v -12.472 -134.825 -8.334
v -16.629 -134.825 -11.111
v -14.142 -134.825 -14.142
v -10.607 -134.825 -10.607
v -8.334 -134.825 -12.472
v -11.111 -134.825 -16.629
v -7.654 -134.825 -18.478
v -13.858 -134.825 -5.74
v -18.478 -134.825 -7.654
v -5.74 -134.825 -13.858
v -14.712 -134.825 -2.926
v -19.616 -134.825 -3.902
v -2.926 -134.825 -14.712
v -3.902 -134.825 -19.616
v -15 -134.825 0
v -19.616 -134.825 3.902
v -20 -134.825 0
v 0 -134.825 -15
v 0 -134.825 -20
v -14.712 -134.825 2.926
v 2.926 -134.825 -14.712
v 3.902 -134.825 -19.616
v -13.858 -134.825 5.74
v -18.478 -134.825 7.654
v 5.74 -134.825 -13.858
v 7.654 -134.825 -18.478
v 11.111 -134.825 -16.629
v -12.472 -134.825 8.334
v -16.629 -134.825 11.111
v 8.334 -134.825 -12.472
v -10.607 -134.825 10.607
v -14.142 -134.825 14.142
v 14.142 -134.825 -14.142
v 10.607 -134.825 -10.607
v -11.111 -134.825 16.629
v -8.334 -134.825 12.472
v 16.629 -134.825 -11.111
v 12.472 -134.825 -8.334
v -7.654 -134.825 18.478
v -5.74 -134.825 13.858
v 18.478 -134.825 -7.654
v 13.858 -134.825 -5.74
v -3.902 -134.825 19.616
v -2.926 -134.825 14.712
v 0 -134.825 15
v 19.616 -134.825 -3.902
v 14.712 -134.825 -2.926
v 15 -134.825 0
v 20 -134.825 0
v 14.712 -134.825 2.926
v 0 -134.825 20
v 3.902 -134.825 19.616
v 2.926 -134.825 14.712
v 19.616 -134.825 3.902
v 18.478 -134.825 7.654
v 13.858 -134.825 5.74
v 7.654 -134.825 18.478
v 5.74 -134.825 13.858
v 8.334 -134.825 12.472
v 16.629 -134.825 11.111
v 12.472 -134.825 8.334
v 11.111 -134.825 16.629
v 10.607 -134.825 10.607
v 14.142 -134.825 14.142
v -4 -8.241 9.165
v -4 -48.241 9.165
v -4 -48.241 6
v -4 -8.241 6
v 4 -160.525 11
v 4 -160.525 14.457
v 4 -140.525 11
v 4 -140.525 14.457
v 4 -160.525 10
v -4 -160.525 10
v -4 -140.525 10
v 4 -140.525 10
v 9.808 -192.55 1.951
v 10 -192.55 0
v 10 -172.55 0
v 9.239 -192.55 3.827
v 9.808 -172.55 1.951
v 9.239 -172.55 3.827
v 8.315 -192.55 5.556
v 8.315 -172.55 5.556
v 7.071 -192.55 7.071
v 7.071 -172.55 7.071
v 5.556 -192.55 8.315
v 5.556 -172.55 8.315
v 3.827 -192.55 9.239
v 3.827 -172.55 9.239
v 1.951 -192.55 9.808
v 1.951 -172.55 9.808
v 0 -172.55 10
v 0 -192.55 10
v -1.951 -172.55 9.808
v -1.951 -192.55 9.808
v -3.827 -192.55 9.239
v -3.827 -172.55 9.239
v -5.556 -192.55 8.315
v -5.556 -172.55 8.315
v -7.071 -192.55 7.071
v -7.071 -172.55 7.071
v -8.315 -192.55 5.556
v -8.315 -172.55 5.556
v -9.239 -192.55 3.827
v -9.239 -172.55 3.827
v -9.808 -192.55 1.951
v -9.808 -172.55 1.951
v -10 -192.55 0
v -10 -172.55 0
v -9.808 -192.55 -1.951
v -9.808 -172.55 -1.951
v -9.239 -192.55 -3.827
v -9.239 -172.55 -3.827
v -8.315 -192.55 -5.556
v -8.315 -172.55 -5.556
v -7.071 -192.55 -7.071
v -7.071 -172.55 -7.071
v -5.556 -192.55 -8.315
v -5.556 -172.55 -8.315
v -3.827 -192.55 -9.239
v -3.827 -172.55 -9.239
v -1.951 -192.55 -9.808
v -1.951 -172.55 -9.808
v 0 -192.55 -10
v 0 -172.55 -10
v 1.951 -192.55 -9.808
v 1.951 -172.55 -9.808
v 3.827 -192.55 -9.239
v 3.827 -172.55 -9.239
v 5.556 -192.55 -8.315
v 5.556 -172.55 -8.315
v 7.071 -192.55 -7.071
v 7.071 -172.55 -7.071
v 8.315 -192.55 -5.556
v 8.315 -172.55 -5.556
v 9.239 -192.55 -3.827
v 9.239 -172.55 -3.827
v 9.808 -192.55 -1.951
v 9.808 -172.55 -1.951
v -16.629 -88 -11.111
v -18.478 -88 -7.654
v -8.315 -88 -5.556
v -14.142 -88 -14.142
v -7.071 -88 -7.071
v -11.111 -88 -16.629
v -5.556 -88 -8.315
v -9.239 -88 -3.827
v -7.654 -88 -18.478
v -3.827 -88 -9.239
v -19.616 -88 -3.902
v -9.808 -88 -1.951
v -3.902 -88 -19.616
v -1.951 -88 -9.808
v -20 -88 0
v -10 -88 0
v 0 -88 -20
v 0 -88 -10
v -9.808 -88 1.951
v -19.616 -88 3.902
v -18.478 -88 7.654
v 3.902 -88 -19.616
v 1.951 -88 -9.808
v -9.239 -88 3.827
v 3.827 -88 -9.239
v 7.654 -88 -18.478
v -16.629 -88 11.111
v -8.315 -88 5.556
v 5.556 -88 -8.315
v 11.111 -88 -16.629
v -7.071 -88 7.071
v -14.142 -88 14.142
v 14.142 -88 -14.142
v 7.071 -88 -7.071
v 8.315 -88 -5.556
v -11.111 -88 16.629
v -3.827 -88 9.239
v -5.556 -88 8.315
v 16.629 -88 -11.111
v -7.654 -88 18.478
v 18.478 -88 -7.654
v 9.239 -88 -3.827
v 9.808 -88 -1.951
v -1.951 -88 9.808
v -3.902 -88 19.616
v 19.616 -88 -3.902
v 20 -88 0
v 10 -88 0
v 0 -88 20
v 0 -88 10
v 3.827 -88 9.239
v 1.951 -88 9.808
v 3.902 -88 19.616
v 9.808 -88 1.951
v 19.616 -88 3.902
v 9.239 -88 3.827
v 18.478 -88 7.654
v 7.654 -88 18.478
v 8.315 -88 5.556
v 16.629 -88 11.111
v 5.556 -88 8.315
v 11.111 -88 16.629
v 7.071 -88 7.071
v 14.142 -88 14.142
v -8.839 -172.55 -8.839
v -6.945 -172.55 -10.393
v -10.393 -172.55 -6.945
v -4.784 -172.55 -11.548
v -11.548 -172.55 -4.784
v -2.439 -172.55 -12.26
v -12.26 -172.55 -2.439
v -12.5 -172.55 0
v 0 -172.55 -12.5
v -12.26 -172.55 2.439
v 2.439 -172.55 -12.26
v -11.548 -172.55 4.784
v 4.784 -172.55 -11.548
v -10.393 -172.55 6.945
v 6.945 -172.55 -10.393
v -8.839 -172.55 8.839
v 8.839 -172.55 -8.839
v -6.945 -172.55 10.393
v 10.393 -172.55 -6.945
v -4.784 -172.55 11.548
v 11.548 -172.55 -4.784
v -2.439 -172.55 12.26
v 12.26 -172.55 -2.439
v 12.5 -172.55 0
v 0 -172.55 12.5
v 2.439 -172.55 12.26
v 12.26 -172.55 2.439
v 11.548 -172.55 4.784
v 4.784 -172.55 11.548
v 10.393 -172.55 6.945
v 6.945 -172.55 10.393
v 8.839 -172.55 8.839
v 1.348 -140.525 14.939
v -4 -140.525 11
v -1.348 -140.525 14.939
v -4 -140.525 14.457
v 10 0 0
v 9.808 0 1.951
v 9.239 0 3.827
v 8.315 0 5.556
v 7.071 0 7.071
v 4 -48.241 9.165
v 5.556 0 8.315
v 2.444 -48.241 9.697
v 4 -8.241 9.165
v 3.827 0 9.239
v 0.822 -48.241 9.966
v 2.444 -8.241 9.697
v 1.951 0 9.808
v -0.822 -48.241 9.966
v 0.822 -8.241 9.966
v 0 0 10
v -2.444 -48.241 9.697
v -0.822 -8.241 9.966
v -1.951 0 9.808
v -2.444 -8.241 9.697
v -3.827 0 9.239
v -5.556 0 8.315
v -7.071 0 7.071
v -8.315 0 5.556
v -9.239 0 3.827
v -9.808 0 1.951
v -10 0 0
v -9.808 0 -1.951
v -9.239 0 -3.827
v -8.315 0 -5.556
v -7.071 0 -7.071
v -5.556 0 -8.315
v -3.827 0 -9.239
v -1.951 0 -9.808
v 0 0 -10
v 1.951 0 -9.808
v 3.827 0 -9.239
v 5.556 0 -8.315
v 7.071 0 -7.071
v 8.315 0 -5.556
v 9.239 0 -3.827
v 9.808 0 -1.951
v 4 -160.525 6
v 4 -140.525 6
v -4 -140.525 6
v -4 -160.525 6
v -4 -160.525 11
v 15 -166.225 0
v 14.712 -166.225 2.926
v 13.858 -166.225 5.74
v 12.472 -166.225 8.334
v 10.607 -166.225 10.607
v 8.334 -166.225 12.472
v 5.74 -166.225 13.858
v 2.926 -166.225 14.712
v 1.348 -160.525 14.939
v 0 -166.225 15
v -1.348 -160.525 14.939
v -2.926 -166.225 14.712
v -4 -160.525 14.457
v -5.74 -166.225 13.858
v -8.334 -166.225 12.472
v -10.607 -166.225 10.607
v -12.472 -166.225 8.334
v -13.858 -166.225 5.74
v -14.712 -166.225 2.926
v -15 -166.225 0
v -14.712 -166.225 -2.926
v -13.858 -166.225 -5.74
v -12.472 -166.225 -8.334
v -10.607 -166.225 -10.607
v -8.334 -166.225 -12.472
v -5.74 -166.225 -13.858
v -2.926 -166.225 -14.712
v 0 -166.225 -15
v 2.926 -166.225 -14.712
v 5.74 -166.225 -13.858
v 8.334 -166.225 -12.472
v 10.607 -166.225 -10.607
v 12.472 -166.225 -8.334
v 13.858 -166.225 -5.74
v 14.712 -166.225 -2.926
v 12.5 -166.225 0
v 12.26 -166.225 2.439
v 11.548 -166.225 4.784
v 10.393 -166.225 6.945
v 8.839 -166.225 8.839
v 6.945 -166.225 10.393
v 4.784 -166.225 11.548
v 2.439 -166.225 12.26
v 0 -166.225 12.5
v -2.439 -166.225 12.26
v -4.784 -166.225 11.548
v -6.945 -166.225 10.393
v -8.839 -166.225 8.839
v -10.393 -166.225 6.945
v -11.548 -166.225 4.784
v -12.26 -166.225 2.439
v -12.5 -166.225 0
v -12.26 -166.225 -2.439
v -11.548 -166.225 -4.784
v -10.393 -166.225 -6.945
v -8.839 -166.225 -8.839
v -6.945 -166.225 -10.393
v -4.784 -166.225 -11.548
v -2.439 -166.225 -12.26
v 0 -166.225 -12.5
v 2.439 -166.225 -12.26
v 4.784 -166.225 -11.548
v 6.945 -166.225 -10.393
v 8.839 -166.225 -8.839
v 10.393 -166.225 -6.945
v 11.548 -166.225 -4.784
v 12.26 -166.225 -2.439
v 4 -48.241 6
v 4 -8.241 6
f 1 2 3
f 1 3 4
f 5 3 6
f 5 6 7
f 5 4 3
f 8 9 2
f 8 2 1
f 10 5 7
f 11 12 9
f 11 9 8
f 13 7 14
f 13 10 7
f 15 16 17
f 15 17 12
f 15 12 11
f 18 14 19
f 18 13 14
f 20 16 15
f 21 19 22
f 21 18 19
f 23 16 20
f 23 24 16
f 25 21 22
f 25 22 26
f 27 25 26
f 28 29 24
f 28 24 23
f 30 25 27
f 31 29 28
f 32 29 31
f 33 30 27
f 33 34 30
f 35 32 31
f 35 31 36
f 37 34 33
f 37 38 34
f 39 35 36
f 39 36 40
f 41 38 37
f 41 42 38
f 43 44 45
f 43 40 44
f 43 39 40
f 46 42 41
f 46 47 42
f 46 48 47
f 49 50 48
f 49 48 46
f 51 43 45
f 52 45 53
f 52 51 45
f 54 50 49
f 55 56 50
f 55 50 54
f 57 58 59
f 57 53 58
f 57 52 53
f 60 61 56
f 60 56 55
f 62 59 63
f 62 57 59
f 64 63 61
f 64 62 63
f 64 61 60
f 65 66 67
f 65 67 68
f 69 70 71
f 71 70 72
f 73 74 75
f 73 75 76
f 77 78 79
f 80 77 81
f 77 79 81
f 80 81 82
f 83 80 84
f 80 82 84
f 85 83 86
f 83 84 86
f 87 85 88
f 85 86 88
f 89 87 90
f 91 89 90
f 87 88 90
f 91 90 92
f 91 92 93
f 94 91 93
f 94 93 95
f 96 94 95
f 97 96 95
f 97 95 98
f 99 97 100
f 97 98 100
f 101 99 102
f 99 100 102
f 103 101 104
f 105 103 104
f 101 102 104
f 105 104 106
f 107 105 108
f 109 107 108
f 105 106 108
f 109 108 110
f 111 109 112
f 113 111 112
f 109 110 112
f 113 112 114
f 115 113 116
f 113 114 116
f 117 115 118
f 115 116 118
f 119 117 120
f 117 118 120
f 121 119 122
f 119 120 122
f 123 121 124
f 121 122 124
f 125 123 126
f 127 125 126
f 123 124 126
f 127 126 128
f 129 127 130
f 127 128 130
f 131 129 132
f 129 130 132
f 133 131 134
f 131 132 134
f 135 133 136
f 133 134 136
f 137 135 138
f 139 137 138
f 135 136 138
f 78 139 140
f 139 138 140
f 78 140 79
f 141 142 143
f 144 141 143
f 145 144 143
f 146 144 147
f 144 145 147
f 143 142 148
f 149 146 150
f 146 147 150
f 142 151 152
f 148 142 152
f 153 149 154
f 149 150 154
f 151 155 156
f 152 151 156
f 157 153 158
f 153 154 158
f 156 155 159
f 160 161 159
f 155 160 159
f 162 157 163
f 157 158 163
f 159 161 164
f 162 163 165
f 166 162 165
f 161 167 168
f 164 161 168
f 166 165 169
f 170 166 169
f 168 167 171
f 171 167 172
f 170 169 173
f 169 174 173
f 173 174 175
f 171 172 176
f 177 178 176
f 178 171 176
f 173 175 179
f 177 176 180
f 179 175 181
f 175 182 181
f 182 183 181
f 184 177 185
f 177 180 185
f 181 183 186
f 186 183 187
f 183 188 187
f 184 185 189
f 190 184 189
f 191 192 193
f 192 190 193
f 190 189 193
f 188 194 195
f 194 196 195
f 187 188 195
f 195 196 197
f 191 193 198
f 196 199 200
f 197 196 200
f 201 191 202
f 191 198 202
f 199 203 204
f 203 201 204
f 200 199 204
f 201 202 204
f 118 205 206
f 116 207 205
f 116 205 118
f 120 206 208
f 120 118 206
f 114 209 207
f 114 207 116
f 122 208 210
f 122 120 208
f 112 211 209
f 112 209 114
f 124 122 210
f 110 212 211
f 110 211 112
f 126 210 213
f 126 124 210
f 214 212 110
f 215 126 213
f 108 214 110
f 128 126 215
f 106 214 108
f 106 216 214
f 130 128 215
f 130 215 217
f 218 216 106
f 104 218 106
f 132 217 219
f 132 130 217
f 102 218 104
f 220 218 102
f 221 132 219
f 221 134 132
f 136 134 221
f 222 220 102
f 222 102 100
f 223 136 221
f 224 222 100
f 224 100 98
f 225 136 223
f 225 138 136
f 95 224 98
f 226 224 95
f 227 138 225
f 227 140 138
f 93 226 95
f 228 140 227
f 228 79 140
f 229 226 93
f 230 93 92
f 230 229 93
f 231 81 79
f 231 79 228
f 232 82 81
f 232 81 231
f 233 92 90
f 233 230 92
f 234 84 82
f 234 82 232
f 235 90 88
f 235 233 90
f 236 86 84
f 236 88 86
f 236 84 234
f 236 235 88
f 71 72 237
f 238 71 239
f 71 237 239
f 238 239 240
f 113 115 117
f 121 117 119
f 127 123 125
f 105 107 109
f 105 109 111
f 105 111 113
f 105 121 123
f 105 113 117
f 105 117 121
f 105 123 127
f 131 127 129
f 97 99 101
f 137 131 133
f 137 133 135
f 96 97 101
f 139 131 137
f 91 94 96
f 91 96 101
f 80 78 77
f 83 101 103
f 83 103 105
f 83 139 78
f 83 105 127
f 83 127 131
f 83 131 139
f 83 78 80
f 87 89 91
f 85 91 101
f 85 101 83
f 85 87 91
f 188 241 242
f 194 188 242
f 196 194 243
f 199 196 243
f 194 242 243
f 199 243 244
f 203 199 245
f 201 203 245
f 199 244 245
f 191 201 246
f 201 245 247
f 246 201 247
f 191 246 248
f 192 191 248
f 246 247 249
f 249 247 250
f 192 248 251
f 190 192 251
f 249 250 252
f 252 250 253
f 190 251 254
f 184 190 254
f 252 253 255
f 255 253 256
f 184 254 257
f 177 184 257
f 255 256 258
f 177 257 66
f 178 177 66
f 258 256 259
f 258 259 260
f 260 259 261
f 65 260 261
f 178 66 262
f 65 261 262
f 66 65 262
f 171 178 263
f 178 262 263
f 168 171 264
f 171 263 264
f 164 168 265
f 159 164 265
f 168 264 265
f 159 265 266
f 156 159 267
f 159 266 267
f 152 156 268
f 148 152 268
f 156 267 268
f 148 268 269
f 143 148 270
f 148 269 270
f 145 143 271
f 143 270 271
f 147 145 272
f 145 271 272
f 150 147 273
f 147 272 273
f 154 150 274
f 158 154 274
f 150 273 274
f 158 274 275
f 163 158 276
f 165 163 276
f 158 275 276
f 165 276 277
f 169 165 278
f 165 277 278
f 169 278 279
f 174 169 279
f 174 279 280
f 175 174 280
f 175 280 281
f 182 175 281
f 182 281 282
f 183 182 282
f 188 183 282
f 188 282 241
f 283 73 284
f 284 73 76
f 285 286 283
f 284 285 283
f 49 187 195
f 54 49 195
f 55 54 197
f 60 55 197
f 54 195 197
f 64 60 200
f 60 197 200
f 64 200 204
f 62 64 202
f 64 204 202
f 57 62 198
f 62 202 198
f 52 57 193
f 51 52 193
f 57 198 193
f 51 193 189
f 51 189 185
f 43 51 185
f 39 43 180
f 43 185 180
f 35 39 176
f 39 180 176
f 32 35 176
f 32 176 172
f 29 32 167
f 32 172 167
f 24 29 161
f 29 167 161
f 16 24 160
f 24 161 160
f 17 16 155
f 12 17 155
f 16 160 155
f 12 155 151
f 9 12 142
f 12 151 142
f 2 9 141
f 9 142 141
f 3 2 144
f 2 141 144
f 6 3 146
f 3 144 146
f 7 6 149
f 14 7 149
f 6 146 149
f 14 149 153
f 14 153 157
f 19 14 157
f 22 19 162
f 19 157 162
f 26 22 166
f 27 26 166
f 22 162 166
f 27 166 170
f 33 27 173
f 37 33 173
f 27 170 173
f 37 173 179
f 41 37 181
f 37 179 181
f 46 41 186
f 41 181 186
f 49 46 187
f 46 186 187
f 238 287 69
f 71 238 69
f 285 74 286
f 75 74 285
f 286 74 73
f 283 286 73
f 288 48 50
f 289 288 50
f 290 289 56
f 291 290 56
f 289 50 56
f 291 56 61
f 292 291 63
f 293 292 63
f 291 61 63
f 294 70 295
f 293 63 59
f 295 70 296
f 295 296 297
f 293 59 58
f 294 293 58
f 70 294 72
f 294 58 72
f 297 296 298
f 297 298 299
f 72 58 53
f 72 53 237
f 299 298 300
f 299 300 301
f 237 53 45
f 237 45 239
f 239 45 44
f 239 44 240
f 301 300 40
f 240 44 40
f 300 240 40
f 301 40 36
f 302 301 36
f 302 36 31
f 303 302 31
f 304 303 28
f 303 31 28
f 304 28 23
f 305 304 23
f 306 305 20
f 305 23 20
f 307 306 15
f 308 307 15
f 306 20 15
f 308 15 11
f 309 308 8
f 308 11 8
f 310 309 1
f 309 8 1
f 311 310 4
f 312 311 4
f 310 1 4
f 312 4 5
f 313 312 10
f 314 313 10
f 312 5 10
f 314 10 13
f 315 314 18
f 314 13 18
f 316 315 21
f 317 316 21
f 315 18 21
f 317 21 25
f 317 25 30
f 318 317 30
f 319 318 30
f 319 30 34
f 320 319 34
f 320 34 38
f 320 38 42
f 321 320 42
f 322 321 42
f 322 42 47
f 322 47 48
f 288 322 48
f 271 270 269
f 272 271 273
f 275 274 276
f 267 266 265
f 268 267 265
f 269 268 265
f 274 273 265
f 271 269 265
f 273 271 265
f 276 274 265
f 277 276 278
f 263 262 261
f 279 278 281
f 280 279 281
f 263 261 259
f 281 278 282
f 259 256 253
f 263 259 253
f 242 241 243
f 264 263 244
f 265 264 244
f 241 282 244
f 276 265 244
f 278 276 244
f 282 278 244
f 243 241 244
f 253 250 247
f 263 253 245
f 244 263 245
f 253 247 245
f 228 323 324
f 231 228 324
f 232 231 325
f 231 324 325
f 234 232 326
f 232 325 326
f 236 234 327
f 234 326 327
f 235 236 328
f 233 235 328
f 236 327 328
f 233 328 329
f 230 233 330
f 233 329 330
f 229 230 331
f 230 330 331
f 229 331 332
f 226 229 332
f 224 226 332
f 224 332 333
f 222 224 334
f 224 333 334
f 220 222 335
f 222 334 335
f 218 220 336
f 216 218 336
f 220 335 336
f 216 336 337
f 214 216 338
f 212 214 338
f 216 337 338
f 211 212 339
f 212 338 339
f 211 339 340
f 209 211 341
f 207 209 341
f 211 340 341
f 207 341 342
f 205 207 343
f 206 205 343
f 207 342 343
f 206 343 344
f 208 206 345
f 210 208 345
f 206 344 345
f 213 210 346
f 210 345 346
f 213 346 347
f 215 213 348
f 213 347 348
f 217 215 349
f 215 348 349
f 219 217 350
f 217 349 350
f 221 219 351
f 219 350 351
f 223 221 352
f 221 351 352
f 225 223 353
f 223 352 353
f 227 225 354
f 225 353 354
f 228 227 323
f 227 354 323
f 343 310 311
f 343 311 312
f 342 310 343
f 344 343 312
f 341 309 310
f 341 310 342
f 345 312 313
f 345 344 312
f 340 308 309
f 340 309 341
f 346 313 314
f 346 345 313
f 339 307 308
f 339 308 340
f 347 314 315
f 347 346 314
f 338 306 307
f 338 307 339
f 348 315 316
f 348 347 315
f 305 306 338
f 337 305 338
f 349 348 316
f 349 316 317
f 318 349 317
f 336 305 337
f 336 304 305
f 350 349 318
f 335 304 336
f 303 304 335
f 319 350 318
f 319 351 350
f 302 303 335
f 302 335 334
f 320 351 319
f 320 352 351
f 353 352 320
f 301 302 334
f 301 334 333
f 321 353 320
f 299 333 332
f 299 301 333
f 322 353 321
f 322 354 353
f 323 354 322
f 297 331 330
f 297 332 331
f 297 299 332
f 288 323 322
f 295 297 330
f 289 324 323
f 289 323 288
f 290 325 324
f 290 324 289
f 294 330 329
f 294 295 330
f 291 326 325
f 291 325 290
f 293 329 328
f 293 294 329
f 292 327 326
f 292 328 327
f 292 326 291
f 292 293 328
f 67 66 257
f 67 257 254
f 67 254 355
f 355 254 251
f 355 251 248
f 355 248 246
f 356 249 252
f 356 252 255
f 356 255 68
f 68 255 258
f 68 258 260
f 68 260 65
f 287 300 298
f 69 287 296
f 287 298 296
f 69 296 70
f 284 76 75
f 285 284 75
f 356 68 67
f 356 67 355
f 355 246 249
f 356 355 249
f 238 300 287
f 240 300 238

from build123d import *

# Parameters (mm, degrees)
F0_R      = 10
F1_DEPTH  = 88
F2_R      = 20
F3_DEPTH  = 46.825
F4_R      = 15
F5_DEPTH  = 31.4
F6_R      = 12.5
F7_DEPTH  = 6.325
F8_R      = 10
F9_DEPTH  = 20
F11_W     = 4
F11_H     = 40
F11_H_2   = 20
F12_DEPTH = 4
F14_W     = 4
F14_H     = 20
F15_DEPTH = 4


with BuildPart() as f1:
    # F0 (on Front) → F1 (new body)
    with BuildSketch(Plane.XZ):
        Circle(F0_R)
    extrude(amount=F1_DEPTH)

    # F2 (on face) → F3 (join)
    with BuildSketch(Plane.XZ.offset(88)):
        Circle(F2_R)
    extrude(amount=F3_DEPTH)

    # F4 (on face) → F5 (join)
    with BuildSketch(Plane.XZ.offset(134.825)):
        Circle(F4_R)
    extrude(amount=F5_DEPTH)

    # F6 (on face) → F7 (join)
    with BuildSketch(Plane.XZ.offset(166.225)):
        Circle(F6_R)
    extrude(amount=F7_DEPTH)

    # F8 (on face) → F9 (join)
    with BuildSketch(Plane.XZ.offset(172.55)):
        Circle(F8_R)
    extrude(amount=F9_DEPTH)

    # F11 (on offset) → F12 (cut)
    with BuildSketch(Plane.XY.offset(10)):
        with Locations((2, -28.240694)):
            Rectangle(F11_W, F11_H)
        with Locations((-2, -28.240694)):
            Rectangle(F11_W, F11_H)
        with Locations((-2, -150.525)):
            Rectangle(F11_W, F11_H_2)
        with Locations((2, -150.525)):
            Rectangle(F11_W, F11_H_2)
    extrude(amount=-F12_DEPTH, mode=Mode.SUBTRACT)

    # F14 (on offset) → F15 (cut)
    with BuildSketch(Plane.XY.offset(15)):
        with Locations((-2, -150.525)):
            Rectangle(F14_W, F14_H)
        with Locations((2, -150.525)):
            Rectangle(F14_W, F14_H)
    extrude(amount=-F15_DEPTH, mode=Mode.SUBTRACT)


solid = f1.part
